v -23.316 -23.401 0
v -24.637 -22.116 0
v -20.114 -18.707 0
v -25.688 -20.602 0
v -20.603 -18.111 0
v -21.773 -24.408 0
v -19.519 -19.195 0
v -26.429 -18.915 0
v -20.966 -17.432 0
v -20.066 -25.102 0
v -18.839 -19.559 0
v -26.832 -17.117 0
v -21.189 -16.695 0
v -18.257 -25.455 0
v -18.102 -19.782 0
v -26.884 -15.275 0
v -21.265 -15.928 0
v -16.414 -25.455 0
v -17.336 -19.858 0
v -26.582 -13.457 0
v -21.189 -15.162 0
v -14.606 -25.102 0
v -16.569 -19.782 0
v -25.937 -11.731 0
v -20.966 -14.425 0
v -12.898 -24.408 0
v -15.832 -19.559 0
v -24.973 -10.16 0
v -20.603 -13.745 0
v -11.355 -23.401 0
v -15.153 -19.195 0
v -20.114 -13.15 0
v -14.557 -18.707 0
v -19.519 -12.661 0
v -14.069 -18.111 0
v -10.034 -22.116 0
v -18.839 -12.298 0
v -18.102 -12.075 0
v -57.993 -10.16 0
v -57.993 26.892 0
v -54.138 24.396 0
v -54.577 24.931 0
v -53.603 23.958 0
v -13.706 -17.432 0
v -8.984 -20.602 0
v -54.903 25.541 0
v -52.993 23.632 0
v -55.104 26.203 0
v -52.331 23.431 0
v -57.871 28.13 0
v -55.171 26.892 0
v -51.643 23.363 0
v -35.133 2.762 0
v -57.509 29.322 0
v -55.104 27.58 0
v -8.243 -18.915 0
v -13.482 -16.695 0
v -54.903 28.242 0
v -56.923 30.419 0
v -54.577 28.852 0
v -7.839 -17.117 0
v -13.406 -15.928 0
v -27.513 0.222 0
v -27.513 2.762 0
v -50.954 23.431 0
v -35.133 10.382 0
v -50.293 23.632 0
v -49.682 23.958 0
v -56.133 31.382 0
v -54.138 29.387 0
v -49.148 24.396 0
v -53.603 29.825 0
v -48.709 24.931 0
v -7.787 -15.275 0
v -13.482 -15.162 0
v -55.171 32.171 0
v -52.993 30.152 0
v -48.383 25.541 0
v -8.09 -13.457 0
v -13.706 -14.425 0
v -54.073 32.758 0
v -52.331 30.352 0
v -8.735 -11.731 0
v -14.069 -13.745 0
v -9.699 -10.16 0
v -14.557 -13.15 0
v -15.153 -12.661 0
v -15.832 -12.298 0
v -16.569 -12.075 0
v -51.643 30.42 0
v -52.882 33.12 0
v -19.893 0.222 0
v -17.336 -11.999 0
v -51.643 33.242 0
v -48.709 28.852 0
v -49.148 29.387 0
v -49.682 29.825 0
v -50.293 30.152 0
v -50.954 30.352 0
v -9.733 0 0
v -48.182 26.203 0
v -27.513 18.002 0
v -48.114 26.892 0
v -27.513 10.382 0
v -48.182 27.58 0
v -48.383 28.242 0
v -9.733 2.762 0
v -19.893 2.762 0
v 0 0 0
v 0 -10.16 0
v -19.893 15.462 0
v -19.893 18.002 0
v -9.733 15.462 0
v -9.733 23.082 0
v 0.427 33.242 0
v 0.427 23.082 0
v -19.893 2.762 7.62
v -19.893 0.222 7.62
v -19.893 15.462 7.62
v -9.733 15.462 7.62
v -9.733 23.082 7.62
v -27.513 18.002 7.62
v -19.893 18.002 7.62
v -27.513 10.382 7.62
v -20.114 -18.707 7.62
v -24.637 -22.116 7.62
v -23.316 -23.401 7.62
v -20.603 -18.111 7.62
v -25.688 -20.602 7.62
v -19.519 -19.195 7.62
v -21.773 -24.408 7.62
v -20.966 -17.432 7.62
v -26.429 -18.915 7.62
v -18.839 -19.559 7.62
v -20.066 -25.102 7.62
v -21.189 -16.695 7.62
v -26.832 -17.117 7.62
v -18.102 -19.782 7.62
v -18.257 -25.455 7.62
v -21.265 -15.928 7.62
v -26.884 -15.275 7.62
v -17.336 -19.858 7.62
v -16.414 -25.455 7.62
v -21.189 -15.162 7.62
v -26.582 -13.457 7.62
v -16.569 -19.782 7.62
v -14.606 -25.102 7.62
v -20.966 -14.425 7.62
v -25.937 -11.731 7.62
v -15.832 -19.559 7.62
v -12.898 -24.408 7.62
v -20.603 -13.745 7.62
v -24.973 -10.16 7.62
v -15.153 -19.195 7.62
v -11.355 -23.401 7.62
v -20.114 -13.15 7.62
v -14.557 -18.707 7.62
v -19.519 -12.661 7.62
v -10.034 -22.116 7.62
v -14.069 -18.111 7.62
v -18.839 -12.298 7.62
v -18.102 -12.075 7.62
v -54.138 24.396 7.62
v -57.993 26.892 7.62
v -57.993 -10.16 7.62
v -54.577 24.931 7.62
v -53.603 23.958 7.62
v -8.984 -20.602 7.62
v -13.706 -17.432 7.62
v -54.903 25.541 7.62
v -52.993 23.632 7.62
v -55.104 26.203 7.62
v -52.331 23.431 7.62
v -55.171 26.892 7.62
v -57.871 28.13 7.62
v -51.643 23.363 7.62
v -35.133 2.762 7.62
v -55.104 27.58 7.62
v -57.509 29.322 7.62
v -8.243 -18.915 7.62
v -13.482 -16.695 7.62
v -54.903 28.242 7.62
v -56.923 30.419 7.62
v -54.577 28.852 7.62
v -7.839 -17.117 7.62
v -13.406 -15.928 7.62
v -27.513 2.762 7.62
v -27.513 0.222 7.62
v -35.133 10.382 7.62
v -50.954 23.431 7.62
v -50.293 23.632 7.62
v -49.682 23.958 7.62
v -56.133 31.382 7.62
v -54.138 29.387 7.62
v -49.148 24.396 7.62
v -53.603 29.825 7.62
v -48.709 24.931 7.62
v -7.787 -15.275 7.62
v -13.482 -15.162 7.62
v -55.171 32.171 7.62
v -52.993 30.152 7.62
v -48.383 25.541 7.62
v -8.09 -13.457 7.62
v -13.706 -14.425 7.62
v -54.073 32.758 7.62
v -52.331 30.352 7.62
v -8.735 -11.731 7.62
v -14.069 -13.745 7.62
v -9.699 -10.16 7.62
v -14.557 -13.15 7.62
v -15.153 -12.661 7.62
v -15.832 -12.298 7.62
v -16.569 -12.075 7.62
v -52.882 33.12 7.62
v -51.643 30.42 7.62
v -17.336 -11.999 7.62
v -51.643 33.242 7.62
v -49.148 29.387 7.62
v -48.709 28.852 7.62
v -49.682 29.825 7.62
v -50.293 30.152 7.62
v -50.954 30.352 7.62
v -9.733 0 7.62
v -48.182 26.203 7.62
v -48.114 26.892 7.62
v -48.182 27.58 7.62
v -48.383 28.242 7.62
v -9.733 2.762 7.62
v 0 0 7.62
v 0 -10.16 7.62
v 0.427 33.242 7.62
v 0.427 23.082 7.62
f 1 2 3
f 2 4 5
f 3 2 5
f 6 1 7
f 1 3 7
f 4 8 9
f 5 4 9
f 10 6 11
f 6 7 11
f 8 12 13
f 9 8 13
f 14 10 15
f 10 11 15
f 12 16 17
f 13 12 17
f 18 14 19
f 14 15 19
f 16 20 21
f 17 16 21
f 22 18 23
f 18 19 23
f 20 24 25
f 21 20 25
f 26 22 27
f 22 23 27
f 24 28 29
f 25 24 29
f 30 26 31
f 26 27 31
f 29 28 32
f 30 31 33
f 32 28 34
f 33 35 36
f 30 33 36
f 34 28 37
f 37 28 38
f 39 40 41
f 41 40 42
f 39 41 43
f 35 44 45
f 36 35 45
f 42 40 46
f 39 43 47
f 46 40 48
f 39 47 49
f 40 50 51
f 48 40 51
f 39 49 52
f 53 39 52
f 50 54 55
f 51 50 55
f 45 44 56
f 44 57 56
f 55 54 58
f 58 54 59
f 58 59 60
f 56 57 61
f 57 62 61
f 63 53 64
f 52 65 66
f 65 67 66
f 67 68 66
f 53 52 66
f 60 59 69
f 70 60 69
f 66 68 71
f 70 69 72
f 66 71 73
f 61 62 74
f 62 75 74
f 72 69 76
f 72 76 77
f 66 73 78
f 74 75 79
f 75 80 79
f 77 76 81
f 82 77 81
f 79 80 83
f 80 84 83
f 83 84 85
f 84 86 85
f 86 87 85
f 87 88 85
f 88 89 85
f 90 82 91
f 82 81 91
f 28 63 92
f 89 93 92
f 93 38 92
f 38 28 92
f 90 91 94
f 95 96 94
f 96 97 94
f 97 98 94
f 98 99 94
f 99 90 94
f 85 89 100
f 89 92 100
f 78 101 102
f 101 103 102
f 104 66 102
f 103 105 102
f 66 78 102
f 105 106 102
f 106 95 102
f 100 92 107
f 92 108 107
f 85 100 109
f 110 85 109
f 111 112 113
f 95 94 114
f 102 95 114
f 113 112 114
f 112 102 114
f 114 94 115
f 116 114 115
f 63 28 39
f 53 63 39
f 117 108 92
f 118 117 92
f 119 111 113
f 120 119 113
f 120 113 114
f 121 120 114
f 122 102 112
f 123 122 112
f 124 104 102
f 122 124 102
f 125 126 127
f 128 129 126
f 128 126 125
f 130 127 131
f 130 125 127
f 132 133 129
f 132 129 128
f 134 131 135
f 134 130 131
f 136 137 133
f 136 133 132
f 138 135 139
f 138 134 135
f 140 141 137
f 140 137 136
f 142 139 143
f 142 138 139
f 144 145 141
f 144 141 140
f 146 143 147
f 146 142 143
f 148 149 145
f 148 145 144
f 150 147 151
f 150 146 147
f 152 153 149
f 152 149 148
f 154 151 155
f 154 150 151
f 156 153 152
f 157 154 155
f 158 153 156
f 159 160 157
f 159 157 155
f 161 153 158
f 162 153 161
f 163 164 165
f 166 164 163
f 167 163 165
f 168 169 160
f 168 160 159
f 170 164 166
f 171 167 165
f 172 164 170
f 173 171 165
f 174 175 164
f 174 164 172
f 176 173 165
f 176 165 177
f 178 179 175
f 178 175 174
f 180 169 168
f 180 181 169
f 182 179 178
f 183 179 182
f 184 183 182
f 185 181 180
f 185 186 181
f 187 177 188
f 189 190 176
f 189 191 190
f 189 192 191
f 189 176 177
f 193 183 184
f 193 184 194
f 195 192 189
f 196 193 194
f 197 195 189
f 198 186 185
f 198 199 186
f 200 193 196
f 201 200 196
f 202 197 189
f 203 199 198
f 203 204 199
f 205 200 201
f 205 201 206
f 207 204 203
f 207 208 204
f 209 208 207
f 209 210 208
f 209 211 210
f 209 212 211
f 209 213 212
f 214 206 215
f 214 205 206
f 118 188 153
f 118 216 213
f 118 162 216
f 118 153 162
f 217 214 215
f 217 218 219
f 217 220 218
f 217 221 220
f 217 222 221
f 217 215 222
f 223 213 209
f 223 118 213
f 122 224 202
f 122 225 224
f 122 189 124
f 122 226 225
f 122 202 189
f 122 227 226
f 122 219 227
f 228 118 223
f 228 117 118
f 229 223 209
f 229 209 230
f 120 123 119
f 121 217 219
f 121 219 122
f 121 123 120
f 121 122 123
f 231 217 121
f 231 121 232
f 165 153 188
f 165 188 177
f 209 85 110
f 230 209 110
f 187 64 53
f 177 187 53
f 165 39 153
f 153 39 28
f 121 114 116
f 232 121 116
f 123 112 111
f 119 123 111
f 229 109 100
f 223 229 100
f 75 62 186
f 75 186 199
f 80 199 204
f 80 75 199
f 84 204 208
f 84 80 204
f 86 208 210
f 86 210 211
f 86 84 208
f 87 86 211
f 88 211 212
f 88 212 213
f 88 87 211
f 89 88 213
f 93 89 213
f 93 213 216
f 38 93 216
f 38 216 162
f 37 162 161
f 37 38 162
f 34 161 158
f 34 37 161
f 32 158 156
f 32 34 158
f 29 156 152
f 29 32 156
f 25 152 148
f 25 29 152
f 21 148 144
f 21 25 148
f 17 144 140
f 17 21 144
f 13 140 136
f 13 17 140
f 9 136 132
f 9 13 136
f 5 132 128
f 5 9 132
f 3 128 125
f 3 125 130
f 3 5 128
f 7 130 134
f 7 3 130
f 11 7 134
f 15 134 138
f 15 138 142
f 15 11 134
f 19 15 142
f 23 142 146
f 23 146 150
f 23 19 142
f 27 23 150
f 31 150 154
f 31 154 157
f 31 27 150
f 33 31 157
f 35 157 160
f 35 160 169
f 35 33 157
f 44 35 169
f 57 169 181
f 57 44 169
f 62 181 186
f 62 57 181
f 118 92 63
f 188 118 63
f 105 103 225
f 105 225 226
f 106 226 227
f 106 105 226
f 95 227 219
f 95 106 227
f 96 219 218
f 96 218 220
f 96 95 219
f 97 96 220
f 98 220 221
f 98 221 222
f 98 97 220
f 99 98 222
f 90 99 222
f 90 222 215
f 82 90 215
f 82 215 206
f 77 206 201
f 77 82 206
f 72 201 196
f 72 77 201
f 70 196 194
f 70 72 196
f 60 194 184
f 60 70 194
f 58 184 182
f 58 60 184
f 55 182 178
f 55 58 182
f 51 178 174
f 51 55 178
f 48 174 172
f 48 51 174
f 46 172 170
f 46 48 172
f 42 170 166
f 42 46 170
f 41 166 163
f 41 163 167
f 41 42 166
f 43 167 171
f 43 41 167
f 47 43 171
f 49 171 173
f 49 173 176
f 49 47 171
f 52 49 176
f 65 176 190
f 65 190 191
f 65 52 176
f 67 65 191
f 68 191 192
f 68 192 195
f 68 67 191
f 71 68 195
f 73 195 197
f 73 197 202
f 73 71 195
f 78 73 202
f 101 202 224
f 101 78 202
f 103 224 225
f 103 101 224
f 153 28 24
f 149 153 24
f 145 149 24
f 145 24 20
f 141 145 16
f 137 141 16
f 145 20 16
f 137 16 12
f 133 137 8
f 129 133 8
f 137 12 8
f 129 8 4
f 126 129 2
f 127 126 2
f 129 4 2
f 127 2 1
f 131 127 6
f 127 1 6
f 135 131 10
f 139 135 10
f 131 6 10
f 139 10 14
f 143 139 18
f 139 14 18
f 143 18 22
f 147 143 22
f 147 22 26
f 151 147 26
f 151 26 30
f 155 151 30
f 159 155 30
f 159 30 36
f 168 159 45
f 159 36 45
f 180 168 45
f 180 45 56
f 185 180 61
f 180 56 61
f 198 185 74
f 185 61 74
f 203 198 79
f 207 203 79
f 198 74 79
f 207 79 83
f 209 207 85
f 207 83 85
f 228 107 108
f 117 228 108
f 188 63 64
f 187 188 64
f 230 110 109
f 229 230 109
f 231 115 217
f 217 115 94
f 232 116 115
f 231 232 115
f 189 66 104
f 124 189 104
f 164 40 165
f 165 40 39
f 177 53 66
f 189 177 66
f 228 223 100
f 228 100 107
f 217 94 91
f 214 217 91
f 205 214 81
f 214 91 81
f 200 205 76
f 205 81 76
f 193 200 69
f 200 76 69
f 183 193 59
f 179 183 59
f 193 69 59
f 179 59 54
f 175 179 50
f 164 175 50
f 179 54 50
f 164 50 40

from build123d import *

# Parameters (mm, degrees)
F0_R     = 3.929234
F0_R_2   = 3.528575
F1_DEPTH = 7.62


with BuildPart() as f1:
    # F0 (on Top) → F1 (new body)
    with BuildSketch(Plane.XY):
        with BuildLine():
            Line((0.427139, 33.241566), (-51.642861, 33.241566))
            ThreePointArc((-51.642861, 33.241566), (-56.132989, 31.381694), (-57.992861, 26.891566))
            Line((-57.992861, 26.891566), (-57.992861, -10.16))
            Line((-57.992861, -10.16), (-24.972861, -10.16))
            ThreePointArc((-24.972861, -10.16), (-17.335705, -25.499214), (-9.69855, -10.16))
            Line((-9.69855, -10.16), (0, -10.16))
            Line((0, -10.16), (0, 0))
            Line((0, 0), (-9.732861, 0))
            Line((-9.732861, 0), (-9.732861, 2.761566))
            Line((-9.732861, 2.761566), (-19.892861, 2.761566))
            Line((-19.892861, 2.761566), (-19.892861, 0.221566))
            Line((-19.892861, 0.221566), (-27.512861, 0.221566))
            Line((-27.512861, 0.221566), (-27.512861, 2.761566))
            Line((-27.512861, 2.761566), (-35.132861, 2.761566))
            Line((-35.132861, 2.761566), (-35.132861, 10.381566))
            Line((-35.132861, 10.381566), (-27.512861, 10.381566))
            Line((-27.512861, 10.381566), (-27.512861, 18.001566))
            Line((-27.512861, 18.001566), (-19.892861, 18.001566))
            Line((-19.892861, 18.001566), (-19.892861, 15.461566))
            Line((-19.892861, 15.461566), (-9.732861, 15.461566))
            Line((-9.732861, 15.461566), (-9.732861, 23.081566))
            Line((-9.732861, 23.081566), (0.427139, 23.081566))
            Line((0.427139, 23.081566), (0.427139, 33.241566))
        make_face()
        with Locations((-17.335705, -15.928397)):
            Circle(F0_R, mode=Mode.SUBTRACT)
        with Locations((-51.642861, 26.891566)):
            Circle(F0_R_2, mode=Mode.SUBTRACT)
    extrude(amount=F1_DEPTH)


solid = f1.part
